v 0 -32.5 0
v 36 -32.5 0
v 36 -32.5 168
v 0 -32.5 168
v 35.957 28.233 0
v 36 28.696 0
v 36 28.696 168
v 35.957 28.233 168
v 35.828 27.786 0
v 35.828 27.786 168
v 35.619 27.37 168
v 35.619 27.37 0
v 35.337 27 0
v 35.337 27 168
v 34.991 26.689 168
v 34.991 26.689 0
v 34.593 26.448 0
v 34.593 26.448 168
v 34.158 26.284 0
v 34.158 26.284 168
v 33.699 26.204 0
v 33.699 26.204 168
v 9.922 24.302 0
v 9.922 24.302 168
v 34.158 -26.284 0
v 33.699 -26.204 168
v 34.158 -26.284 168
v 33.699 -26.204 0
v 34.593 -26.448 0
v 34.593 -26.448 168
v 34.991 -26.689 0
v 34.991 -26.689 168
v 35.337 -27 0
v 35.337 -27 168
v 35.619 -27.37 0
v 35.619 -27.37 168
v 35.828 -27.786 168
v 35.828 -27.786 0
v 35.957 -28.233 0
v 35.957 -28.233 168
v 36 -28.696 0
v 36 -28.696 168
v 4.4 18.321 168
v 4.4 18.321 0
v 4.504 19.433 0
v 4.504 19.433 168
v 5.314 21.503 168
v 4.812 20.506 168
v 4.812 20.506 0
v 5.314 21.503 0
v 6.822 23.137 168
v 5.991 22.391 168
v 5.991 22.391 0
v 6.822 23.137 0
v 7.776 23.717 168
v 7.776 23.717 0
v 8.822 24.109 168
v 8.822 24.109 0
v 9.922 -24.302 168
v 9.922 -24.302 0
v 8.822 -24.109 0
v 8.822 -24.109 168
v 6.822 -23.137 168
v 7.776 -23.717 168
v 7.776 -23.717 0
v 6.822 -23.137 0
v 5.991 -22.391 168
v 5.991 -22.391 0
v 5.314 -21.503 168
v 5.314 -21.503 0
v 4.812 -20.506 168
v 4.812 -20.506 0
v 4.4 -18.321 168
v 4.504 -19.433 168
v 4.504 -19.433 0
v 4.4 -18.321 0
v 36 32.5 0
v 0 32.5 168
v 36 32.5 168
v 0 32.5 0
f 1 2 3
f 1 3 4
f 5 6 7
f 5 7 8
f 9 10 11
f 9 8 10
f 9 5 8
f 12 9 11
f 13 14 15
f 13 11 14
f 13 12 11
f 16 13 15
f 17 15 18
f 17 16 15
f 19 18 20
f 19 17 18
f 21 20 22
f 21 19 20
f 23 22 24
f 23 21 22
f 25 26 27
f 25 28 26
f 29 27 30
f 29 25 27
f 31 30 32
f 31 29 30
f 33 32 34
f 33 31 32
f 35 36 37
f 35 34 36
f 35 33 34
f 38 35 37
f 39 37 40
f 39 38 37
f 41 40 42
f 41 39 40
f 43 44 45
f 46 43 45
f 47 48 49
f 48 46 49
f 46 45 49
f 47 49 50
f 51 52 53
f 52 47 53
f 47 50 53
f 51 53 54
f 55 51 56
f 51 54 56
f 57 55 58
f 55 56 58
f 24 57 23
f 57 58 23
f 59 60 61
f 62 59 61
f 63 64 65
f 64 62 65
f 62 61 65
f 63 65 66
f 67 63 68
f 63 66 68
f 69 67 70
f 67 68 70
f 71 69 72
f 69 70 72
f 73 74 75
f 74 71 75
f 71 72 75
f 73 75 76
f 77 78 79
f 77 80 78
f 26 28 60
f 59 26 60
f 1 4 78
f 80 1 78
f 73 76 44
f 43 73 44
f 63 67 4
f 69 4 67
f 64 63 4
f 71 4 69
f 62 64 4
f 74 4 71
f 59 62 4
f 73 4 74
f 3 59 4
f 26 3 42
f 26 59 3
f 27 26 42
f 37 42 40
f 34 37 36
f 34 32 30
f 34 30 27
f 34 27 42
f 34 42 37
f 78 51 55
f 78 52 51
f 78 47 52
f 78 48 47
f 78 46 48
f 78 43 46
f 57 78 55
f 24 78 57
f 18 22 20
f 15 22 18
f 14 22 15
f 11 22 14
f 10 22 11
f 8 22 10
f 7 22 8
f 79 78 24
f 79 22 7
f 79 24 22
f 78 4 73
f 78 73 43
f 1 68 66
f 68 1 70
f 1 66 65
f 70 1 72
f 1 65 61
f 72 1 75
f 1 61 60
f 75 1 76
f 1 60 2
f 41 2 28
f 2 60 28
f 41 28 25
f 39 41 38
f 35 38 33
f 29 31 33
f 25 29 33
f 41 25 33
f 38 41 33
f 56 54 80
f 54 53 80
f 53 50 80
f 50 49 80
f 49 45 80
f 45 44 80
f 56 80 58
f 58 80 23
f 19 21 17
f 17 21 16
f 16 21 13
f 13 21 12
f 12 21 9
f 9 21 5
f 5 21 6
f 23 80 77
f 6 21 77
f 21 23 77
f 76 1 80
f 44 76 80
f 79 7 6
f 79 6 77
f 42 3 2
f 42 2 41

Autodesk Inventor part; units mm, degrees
ref_plane "YZ Plane" through (0, 0, 0) normal (1, 0, 0) x (0, 1, 0)
ref_plane "Начальная плоскость" through (0, 0, 0) normal (0, 0, 1) x (1, 0, 0)
ref_plane "Конечная плоскость" through (0, 0, 168) normal (0, 0, 1) x (1, 0, 0)
sketch "Эскиз" plane through (0, 0, 0) normal (0, 0, 1) x (1, 0, 0)
  line L0 (36, -32.5) -> (0, -32.5)
  line L1 (36, -32.5) -> (36, -28.696)
  line L2 (33.6994, -26.2039) -> (9.9215, -24.3017)
  line L3 (4.4, -18.3208) -> (4.4, 18.3208)
  line L4 (33.6994, 26.2039) -> (9.9215, 24.3017)
  line L5 (36, 28.696) -> (36, 32.5)
  line L6 (0, 32.5) -> (36, 32.5)
  line L7 (0, -32.5) -> (0, 32.5)
  arc A0 (4.4, -18.3208) -> (9.9215, -24.3017) centre (10.4, -18.3208) ccw
  arc A1 (9.9215, 24.3017) -> (4.4, 18.3208) centre (10.4, 18.3208) ccw
  arc A2 (36, -28.696) -> (33.6994, -26.2039) centre (33.5, -28.696) ccw
  arc A3 (33.6994, 26.2039) -> (36, 28.696) centre (33.5, 28.696) ccw
  line L8 (0, 45.5) -> (0, -45.5) construction
  line L9 (-7.2974, 0) -> (43.7847, 0) construction
  point P0 (36, -26.388)
  point P1 (4.4, -23.86)
  point P2 (4.4, 23.86)
  point P3 (36, 26.388)
  dimension "d3" = 36
  dimension "d5" = 4.4
  dimension "d7" = 65
  dimension "d9" = 8.64
  dimension "d11" = 8.64
  dimension "d13" = 6.112
  dimension "d15" = 6.112
  dimension "d22" = 6
  dimension "d23" = 2.5
  dimension "d24" = 32.5
  dimension "d25" = 0
extrude "Тело" add sketch "Эскиз" along normal up to surface (168 mm away) from surface at 0
sketch "Sketch3" plane through (0, 0, 0) normal (0, 0, 1) x (1, 0, 0)
  line L0 (0, 0) -> (10, 0)
ref_plane "Work Plane7" through (0, 0, 0) normal (0, -1, 0) x (1, 0, 0)
sketch "Sketch4" plane through (0, 0, 0) normal (0, -1, 0) x (1, 0, 0)
  line L0 (-2, 0) -> (12, 0)
  line L1 (-2, 168) -> (12, 168)
  dimension "d29" = 168
equation "\"d3\" = b"
equation "\"d5\" = t1"
equation "\"d7\" = ParH"
equation "\"d9\" = msp_x1 + t2"
equation "\"d11\" = msp_x1 + t2"
equation "\"d13\" = -msp_x2 + t2"
equation "\"d15\" = -msp_x2 + t2"
equation "\"d22\" = R"
equation "\"d23\" = R1"
equation "\"d24\" = 0.5 * d7"
equation "\"d16\" = G_L"
equation "\"R1\" = 2.5"
equation "\"R\" = 6"
equation "\"t1\" = 4.4"
equation "\"t2\" = 7.2"
equation "\"ParH\" = 65"
equation "\"b\" = 36"
equation "\"msp_x1\" = 0.04 * b"
equation "\"msp_x2\" = -0.08 * t1 + 0.04 * b"
equation "\"G_L\" = d29"
equation "\"ex\" = 0"
equation "\"G_OFFSET_START\" = 0"
equation "\"G_OFFSET_END\" = 0"
equation "\"d27\" = G_OFFSET_END + B_L"
equation "\"B_L\" = 168"
properties part number "Швеллер 6.5U-168 ГОСТ 8240-97" material "Сталь, мягкая"
